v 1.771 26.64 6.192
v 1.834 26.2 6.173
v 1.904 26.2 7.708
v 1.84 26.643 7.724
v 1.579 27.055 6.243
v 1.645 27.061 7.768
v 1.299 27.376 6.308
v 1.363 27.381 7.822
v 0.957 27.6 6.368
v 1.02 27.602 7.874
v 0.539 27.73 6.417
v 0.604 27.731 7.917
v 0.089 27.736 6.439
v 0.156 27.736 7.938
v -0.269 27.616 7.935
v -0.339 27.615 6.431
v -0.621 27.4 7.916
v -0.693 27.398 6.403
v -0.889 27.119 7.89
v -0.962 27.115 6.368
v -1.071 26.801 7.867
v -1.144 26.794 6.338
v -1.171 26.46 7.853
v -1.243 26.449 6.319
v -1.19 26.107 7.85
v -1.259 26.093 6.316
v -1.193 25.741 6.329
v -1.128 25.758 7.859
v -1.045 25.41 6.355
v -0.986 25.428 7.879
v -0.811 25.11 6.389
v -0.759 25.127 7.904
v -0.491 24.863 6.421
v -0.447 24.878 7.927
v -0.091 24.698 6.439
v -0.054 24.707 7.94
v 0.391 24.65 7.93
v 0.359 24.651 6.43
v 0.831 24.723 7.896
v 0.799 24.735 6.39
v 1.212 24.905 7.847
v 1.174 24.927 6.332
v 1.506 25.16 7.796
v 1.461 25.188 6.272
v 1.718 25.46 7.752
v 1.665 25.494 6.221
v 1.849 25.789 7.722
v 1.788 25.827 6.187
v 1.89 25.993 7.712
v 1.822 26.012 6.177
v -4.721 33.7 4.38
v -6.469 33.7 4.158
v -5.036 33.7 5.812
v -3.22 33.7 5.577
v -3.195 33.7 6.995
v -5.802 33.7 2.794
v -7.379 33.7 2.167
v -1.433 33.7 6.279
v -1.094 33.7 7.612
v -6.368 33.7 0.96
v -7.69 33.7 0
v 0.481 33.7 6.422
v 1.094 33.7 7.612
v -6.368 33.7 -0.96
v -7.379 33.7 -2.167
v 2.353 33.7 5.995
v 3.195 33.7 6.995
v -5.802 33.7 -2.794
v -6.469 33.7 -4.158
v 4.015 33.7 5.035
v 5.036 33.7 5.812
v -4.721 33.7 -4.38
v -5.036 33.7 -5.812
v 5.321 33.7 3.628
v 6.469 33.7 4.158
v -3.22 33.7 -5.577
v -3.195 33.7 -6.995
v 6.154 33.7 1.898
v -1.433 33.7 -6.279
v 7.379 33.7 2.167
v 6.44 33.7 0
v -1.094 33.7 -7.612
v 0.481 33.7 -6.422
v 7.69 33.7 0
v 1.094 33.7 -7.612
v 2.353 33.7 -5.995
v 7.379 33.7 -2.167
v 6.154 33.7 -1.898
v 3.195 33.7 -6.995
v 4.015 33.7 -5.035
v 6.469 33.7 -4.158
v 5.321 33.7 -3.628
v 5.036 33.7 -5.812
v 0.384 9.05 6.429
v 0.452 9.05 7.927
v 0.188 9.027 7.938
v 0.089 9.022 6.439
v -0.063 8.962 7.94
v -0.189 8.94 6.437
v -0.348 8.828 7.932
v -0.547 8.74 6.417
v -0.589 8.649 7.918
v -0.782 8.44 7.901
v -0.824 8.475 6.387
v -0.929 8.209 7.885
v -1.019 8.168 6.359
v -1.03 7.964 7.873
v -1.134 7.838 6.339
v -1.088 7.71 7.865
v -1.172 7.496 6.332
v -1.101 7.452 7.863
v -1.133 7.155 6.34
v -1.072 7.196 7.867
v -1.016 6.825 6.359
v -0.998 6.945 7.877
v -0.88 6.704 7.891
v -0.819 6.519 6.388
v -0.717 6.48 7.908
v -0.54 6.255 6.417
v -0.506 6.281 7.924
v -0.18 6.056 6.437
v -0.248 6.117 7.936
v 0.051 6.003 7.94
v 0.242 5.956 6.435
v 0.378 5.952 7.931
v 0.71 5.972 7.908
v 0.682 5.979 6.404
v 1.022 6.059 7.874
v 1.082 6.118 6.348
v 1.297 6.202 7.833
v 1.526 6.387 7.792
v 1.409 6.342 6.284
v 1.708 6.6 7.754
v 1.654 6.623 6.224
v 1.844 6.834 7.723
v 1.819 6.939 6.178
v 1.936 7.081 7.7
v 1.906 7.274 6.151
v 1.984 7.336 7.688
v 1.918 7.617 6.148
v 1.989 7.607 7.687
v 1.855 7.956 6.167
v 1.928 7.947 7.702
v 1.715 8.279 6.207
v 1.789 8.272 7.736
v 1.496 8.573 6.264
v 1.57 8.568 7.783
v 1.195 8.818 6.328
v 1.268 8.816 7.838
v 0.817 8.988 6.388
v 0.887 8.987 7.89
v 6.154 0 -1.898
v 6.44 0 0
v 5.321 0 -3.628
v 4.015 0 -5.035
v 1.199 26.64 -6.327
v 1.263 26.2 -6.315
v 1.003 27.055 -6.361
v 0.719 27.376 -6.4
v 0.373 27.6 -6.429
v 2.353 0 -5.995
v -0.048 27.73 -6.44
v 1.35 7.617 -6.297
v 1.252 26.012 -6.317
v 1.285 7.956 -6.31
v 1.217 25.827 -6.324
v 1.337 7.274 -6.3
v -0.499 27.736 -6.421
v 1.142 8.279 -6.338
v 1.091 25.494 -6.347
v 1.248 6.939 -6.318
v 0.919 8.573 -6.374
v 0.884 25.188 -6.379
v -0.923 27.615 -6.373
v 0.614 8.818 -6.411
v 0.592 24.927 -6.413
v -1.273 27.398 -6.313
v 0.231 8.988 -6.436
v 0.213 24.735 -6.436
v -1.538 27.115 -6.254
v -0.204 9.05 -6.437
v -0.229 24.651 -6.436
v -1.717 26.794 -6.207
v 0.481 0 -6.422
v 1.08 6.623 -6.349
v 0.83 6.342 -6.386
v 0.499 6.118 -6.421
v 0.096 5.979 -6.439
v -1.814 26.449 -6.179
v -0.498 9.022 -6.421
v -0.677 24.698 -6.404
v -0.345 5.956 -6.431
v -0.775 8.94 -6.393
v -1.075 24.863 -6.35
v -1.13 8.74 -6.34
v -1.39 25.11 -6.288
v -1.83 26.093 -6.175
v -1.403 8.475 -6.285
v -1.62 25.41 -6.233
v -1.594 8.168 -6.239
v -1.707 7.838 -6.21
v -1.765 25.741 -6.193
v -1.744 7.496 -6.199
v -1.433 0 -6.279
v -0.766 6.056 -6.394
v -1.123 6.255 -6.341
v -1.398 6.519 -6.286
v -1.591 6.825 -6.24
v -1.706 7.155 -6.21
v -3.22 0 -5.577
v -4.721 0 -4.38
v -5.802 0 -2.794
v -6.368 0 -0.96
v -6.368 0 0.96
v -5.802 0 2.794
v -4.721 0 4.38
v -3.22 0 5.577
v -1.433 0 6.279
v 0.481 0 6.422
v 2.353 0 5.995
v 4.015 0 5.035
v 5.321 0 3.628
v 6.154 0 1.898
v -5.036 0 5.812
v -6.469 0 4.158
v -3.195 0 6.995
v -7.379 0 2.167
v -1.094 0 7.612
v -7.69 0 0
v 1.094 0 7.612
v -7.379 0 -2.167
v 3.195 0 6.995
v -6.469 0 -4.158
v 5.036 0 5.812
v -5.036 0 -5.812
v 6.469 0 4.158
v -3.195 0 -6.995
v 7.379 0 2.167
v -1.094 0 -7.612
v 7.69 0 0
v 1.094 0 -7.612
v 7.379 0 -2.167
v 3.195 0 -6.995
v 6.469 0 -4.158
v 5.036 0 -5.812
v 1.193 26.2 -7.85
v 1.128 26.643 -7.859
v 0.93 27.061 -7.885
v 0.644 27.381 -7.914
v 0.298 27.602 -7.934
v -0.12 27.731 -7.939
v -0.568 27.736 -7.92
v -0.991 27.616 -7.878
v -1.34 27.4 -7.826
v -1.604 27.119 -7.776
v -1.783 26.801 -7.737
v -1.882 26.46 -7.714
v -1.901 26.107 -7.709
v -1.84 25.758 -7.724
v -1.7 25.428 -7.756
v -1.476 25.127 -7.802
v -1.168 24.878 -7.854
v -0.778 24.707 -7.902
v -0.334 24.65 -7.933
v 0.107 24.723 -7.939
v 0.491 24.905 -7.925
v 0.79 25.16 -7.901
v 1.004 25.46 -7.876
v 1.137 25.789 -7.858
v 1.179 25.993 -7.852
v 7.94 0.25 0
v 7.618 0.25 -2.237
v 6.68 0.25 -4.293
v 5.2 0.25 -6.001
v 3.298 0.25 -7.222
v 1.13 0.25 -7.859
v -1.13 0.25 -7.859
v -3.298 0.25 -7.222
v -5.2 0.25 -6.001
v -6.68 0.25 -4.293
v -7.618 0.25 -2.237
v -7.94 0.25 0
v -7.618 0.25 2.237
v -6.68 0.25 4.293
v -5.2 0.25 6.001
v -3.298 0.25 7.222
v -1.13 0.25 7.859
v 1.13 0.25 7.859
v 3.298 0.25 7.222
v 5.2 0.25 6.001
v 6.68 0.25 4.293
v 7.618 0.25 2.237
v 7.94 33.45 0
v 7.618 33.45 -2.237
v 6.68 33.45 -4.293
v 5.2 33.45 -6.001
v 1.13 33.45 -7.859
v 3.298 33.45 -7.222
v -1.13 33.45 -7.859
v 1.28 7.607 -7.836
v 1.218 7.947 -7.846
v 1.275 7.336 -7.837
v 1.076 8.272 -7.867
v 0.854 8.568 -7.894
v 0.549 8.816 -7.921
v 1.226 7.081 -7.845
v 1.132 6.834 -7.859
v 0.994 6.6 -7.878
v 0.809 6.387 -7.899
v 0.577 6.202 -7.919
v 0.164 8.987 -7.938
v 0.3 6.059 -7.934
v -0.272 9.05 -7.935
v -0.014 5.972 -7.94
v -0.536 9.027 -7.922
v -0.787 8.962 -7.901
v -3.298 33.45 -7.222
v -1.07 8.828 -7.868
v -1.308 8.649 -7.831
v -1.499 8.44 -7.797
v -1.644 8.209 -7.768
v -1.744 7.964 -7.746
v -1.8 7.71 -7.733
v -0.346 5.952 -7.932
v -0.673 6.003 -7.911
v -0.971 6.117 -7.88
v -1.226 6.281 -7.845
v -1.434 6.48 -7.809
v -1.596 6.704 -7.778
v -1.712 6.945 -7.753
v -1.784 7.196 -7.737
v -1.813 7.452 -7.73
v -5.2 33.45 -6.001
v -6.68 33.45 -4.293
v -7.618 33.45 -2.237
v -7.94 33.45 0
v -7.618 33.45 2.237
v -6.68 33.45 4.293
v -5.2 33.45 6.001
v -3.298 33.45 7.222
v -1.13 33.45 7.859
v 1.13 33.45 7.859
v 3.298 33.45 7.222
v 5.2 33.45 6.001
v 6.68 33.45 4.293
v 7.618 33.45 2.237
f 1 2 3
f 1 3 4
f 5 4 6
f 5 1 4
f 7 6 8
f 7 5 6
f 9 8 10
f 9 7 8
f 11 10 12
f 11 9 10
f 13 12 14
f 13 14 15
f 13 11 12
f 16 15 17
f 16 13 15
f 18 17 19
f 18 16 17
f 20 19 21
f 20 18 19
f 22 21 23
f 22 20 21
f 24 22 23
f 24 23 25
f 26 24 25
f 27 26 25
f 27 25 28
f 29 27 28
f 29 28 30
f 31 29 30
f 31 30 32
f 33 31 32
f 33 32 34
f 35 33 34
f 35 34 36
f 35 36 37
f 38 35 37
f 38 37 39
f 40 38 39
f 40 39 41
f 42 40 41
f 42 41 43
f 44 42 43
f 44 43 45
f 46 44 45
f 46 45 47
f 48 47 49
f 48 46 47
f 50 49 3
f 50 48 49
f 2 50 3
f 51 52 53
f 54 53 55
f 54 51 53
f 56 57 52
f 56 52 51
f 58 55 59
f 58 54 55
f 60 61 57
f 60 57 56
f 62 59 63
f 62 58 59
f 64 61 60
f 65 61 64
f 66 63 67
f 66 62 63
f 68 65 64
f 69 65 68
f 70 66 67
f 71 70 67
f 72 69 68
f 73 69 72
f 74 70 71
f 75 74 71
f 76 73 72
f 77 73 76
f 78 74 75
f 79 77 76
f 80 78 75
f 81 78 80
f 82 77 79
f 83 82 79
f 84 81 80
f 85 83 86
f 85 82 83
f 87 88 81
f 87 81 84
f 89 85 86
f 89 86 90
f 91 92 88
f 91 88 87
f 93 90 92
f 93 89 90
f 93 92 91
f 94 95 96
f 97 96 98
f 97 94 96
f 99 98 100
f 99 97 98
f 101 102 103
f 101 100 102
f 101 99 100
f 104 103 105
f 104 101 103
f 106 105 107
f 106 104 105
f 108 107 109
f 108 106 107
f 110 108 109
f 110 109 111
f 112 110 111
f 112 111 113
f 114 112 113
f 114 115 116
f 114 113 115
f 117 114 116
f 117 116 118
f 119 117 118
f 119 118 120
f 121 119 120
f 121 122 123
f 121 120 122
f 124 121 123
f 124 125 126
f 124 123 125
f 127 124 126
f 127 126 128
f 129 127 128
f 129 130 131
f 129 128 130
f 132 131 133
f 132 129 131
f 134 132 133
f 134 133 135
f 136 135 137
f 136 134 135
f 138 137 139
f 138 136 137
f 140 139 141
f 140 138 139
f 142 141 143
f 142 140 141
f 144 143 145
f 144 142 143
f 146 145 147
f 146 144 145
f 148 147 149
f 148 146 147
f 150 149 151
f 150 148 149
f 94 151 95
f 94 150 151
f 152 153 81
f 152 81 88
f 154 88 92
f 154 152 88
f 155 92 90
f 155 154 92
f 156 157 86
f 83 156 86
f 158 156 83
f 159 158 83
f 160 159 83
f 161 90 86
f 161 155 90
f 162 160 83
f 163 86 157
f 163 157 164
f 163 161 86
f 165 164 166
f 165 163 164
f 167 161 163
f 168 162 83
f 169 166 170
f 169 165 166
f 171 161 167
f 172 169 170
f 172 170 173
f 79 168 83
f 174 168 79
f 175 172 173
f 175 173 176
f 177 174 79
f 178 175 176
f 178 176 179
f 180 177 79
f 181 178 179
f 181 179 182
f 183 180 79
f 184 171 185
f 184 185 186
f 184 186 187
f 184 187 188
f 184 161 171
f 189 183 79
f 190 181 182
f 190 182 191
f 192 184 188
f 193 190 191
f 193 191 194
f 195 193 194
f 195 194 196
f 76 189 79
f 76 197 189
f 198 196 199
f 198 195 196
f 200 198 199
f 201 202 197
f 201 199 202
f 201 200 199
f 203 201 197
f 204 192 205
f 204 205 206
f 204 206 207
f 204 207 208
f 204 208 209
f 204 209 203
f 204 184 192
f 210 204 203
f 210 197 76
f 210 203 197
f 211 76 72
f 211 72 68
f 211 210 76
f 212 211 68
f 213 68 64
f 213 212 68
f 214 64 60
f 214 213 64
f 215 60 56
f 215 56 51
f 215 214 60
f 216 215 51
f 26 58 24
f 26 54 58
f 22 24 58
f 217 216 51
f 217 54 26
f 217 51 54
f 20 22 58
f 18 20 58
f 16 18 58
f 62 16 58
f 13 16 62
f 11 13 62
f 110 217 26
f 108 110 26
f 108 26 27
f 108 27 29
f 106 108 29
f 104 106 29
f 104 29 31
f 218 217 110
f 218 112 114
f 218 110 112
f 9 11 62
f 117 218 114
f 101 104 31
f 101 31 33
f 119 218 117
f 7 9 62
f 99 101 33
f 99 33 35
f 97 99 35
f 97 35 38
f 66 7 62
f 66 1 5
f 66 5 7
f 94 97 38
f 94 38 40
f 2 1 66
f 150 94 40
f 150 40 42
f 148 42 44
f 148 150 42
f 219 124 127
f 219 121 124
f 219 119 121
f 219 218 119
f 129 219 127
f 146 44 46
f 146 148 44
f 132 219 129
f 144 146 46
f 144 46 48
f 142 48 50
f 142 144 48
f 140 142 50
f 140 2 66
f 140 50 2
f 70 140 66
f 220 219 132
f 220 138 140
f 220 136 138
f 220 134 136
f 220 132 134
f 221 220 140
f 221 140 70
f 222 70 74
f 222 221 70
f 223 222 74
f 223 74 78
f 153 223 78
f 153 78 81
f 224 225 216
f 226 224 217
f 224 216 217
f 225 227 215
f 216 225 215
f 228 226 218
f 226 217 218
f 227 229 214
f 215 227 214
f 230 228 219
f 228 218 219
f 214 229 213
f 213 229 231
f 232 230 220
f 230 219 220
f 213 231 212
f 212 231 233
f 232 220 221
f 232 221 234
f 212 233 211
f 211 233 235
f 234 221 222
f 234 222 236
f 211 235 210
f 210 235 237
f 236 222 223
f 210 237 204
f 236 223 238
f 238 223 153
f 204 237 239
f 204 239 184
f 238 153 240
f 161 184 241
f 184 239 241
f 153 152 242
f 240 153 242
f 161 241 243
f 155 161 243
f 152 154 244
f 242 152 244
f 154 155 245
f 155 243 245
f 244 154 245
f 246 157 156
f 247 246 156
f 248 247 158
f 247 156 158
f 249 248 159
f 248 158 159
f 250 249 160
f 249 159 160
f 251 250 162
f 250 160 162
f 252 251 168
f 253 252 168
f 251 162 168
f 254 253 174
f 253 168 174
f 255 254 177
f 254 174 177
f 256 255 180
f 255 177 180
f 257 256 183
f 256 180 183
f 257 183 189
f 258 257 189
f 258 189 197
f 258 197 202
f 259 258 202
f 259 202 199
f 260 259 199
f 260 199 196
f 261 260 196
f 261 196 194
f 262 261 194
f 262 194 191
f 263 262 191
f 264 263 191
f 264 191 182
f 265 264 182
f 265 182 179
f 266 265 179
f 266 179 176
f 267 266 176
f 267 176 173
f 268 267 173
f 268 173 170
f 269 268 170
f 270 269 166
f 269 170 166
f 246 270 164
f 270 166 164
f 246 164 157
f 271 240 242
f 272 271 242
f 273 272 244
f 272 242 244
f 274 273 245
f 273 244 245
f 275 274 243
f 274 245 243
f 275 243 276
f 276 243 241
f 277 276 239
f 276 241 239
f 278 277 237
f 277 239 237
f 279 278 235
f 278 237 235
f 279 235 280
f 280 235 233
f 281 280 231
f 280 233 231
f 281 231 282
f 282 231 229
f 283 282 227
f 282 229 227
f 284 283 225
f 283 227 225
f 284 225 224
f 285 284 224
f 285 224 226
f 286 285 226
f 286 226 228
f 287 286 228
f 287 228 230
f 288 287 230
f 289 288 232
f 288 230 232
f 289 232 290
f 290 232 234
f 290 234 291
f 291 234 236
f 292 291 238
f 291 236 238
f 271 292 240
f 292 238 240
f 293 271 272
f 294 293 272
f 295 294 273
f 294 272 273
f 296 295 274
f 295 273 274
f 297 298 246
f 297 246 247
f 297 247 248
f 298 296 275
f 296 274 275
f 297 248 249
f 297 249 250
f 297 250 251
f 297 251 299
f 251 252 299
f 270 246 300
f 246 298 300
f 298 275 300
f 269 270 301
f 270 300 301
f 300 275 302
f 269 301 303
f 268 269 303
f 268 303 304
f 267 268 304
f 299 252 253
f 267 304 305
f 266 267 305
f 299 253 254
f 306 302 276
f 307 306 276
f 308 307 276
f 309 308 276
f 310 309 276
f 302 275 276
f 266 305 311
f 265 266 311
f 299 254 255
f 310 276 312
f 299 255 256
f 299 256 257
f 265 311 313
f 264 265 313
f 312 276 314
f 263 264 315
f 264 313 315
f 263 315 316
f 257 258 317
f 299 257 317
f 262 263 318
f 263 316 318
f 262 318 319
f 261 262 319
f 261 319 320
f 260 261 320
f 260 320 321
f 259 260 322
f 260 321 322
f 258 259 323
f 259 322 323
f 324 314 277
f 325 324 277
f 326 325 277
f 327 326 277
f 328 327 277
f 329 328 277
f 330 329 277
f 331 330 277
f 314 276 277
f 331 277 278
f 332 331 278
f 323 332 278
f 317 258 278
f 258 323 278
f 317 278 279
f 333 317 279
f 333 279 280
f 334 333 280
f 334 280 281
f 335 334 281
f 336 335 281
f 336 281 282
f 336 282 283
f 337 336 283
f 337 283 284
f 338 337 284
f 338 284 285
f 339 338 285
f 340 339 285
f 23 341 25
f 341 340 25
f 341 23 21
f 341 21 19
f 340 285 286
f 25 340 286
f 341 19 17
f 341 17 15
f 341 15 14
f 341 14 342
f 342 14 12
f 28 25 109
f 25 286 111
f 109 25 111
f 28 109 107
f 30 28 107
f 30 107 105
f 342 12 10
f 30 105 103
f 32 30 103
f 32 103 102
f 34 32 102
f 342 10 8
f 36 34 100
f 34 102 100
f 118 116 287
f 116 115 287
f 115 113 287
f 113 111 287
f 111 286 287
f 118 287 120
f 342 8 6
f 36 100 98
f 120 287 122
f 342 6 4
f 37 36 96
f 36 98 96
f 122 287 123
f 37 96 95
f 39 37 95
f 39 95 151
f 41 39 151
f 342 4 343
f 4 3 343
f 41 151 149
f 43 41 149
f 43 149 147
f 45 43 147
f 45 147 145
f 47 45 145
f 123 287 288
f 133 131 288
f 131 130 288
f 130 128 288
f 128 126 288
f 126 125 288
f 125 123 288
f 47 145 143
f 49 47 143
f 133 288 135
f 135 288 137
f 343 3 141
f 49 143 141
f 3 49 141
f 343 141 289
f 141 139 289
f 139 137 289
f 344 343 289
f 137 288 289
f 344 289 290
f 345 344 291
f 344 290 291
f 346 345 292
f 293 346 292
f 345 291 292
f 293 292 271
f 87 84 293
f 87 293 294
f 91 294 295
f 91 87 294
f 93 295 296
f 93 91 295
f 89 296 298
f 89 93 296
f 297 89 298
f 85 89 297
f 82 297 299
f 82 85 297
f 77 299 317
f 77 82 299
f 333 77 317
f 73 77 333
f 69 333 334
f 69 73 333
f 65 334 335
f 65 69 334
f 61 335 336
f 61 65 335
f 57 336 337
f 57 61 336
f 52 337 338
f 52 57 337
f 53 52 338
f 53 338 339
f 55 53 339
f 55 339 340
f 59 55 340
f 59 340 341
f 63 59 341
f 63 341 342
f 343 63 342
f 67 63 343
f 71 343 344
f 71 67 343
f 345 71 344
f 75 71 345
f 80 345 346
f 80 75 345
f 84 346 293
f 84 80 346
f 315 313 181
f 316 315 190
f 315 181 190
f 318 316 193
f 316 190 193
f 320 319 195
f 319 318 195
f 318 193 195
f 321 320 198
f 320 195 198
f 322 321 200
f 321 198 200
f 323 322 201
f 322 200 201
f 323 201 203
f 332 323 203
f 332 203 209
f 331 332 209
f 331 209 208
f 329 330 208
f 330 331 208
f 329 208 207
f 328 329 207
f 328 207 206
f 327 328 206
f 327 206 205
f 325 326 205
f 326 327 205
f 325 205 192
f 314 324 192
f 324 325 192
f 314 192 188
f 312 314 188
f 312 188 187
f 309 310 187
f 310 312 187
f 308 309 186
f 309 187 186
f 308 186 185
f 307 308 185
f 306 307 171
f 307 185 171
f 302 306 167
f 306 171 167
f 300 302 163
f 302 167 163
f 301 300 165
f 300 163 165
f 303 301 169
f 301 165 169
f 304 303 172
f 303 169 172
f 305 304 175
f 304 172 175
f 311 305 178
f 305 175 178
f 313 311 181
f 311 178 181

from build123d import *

# Parameters (mm, degrees)
SKETCH1_R               = 7.94
SKETCH1_R_2             = 6.44
BOSS_EXTRUDE1_DEPTH     = 33.7
CHAMFER1_SIZE           = 0.25
SKETCH2_R               = 1.55
SKETCH2_RX              = 1.55
SKETCH2_RY              = 1.54981566
CUT_EXTRUDE1_DEPTH      = 3.443979861
CUT_EXTRUDE1_DEPTH_BACK = 15.143979861


with BuildPart() as part:
    # Sketch1 → Boss-Extrude1 (new body)
    with BuildSketch(Plane(origin=(0, 0, 0), x_dir=(1, 0, 0), z_dir=(0, 1, 0))):
        Circle(SKETCH1_R)
        Circle(SKETCH1_R_2, mode=Mode.SUBTRACT)
    extrude(amount=BOSS_EXTRUDE1_DEPTH)

    # Chamfer1
    chamfer1_edges = [part.edges().sort_by_distance(p)[0] for p in [
        (-7.94, 0, 0),
        (-7.94, 33.7, 0),
    ]]
    chamfer(chamfer1_edges, length=CHAMFER1_SIZE)

    # Sketch2 → Cut-Extrude1 (cut, two sides)
    with BuildSketch(Plane(origin=(0.266895271, 0, 5.843908531), x_dir=(0.998958723, 0, -0.045623123), z_dir=(0.045623123, 0, 0.998958723))) as cut_extrude1_sk:
        with Locations((0, 26.2)):
            Circle(SKETCH2_R)
        with Locations(Location((0.090219685, 7.5), (0, 0, 90))):
            Ellipse(SKETCH2_RX, SKETCH2_RY)
    extrude(amount=CUT_EXTRUDE1_DEPTH, mode=Mode.SUBTRACT)
    extrude(cut_extrude1_sk.sketch, amount=-CUT_EXTRUDE1_DEPTH_BACK, mode=Mode.SUBTRACT)


solid = part.part
